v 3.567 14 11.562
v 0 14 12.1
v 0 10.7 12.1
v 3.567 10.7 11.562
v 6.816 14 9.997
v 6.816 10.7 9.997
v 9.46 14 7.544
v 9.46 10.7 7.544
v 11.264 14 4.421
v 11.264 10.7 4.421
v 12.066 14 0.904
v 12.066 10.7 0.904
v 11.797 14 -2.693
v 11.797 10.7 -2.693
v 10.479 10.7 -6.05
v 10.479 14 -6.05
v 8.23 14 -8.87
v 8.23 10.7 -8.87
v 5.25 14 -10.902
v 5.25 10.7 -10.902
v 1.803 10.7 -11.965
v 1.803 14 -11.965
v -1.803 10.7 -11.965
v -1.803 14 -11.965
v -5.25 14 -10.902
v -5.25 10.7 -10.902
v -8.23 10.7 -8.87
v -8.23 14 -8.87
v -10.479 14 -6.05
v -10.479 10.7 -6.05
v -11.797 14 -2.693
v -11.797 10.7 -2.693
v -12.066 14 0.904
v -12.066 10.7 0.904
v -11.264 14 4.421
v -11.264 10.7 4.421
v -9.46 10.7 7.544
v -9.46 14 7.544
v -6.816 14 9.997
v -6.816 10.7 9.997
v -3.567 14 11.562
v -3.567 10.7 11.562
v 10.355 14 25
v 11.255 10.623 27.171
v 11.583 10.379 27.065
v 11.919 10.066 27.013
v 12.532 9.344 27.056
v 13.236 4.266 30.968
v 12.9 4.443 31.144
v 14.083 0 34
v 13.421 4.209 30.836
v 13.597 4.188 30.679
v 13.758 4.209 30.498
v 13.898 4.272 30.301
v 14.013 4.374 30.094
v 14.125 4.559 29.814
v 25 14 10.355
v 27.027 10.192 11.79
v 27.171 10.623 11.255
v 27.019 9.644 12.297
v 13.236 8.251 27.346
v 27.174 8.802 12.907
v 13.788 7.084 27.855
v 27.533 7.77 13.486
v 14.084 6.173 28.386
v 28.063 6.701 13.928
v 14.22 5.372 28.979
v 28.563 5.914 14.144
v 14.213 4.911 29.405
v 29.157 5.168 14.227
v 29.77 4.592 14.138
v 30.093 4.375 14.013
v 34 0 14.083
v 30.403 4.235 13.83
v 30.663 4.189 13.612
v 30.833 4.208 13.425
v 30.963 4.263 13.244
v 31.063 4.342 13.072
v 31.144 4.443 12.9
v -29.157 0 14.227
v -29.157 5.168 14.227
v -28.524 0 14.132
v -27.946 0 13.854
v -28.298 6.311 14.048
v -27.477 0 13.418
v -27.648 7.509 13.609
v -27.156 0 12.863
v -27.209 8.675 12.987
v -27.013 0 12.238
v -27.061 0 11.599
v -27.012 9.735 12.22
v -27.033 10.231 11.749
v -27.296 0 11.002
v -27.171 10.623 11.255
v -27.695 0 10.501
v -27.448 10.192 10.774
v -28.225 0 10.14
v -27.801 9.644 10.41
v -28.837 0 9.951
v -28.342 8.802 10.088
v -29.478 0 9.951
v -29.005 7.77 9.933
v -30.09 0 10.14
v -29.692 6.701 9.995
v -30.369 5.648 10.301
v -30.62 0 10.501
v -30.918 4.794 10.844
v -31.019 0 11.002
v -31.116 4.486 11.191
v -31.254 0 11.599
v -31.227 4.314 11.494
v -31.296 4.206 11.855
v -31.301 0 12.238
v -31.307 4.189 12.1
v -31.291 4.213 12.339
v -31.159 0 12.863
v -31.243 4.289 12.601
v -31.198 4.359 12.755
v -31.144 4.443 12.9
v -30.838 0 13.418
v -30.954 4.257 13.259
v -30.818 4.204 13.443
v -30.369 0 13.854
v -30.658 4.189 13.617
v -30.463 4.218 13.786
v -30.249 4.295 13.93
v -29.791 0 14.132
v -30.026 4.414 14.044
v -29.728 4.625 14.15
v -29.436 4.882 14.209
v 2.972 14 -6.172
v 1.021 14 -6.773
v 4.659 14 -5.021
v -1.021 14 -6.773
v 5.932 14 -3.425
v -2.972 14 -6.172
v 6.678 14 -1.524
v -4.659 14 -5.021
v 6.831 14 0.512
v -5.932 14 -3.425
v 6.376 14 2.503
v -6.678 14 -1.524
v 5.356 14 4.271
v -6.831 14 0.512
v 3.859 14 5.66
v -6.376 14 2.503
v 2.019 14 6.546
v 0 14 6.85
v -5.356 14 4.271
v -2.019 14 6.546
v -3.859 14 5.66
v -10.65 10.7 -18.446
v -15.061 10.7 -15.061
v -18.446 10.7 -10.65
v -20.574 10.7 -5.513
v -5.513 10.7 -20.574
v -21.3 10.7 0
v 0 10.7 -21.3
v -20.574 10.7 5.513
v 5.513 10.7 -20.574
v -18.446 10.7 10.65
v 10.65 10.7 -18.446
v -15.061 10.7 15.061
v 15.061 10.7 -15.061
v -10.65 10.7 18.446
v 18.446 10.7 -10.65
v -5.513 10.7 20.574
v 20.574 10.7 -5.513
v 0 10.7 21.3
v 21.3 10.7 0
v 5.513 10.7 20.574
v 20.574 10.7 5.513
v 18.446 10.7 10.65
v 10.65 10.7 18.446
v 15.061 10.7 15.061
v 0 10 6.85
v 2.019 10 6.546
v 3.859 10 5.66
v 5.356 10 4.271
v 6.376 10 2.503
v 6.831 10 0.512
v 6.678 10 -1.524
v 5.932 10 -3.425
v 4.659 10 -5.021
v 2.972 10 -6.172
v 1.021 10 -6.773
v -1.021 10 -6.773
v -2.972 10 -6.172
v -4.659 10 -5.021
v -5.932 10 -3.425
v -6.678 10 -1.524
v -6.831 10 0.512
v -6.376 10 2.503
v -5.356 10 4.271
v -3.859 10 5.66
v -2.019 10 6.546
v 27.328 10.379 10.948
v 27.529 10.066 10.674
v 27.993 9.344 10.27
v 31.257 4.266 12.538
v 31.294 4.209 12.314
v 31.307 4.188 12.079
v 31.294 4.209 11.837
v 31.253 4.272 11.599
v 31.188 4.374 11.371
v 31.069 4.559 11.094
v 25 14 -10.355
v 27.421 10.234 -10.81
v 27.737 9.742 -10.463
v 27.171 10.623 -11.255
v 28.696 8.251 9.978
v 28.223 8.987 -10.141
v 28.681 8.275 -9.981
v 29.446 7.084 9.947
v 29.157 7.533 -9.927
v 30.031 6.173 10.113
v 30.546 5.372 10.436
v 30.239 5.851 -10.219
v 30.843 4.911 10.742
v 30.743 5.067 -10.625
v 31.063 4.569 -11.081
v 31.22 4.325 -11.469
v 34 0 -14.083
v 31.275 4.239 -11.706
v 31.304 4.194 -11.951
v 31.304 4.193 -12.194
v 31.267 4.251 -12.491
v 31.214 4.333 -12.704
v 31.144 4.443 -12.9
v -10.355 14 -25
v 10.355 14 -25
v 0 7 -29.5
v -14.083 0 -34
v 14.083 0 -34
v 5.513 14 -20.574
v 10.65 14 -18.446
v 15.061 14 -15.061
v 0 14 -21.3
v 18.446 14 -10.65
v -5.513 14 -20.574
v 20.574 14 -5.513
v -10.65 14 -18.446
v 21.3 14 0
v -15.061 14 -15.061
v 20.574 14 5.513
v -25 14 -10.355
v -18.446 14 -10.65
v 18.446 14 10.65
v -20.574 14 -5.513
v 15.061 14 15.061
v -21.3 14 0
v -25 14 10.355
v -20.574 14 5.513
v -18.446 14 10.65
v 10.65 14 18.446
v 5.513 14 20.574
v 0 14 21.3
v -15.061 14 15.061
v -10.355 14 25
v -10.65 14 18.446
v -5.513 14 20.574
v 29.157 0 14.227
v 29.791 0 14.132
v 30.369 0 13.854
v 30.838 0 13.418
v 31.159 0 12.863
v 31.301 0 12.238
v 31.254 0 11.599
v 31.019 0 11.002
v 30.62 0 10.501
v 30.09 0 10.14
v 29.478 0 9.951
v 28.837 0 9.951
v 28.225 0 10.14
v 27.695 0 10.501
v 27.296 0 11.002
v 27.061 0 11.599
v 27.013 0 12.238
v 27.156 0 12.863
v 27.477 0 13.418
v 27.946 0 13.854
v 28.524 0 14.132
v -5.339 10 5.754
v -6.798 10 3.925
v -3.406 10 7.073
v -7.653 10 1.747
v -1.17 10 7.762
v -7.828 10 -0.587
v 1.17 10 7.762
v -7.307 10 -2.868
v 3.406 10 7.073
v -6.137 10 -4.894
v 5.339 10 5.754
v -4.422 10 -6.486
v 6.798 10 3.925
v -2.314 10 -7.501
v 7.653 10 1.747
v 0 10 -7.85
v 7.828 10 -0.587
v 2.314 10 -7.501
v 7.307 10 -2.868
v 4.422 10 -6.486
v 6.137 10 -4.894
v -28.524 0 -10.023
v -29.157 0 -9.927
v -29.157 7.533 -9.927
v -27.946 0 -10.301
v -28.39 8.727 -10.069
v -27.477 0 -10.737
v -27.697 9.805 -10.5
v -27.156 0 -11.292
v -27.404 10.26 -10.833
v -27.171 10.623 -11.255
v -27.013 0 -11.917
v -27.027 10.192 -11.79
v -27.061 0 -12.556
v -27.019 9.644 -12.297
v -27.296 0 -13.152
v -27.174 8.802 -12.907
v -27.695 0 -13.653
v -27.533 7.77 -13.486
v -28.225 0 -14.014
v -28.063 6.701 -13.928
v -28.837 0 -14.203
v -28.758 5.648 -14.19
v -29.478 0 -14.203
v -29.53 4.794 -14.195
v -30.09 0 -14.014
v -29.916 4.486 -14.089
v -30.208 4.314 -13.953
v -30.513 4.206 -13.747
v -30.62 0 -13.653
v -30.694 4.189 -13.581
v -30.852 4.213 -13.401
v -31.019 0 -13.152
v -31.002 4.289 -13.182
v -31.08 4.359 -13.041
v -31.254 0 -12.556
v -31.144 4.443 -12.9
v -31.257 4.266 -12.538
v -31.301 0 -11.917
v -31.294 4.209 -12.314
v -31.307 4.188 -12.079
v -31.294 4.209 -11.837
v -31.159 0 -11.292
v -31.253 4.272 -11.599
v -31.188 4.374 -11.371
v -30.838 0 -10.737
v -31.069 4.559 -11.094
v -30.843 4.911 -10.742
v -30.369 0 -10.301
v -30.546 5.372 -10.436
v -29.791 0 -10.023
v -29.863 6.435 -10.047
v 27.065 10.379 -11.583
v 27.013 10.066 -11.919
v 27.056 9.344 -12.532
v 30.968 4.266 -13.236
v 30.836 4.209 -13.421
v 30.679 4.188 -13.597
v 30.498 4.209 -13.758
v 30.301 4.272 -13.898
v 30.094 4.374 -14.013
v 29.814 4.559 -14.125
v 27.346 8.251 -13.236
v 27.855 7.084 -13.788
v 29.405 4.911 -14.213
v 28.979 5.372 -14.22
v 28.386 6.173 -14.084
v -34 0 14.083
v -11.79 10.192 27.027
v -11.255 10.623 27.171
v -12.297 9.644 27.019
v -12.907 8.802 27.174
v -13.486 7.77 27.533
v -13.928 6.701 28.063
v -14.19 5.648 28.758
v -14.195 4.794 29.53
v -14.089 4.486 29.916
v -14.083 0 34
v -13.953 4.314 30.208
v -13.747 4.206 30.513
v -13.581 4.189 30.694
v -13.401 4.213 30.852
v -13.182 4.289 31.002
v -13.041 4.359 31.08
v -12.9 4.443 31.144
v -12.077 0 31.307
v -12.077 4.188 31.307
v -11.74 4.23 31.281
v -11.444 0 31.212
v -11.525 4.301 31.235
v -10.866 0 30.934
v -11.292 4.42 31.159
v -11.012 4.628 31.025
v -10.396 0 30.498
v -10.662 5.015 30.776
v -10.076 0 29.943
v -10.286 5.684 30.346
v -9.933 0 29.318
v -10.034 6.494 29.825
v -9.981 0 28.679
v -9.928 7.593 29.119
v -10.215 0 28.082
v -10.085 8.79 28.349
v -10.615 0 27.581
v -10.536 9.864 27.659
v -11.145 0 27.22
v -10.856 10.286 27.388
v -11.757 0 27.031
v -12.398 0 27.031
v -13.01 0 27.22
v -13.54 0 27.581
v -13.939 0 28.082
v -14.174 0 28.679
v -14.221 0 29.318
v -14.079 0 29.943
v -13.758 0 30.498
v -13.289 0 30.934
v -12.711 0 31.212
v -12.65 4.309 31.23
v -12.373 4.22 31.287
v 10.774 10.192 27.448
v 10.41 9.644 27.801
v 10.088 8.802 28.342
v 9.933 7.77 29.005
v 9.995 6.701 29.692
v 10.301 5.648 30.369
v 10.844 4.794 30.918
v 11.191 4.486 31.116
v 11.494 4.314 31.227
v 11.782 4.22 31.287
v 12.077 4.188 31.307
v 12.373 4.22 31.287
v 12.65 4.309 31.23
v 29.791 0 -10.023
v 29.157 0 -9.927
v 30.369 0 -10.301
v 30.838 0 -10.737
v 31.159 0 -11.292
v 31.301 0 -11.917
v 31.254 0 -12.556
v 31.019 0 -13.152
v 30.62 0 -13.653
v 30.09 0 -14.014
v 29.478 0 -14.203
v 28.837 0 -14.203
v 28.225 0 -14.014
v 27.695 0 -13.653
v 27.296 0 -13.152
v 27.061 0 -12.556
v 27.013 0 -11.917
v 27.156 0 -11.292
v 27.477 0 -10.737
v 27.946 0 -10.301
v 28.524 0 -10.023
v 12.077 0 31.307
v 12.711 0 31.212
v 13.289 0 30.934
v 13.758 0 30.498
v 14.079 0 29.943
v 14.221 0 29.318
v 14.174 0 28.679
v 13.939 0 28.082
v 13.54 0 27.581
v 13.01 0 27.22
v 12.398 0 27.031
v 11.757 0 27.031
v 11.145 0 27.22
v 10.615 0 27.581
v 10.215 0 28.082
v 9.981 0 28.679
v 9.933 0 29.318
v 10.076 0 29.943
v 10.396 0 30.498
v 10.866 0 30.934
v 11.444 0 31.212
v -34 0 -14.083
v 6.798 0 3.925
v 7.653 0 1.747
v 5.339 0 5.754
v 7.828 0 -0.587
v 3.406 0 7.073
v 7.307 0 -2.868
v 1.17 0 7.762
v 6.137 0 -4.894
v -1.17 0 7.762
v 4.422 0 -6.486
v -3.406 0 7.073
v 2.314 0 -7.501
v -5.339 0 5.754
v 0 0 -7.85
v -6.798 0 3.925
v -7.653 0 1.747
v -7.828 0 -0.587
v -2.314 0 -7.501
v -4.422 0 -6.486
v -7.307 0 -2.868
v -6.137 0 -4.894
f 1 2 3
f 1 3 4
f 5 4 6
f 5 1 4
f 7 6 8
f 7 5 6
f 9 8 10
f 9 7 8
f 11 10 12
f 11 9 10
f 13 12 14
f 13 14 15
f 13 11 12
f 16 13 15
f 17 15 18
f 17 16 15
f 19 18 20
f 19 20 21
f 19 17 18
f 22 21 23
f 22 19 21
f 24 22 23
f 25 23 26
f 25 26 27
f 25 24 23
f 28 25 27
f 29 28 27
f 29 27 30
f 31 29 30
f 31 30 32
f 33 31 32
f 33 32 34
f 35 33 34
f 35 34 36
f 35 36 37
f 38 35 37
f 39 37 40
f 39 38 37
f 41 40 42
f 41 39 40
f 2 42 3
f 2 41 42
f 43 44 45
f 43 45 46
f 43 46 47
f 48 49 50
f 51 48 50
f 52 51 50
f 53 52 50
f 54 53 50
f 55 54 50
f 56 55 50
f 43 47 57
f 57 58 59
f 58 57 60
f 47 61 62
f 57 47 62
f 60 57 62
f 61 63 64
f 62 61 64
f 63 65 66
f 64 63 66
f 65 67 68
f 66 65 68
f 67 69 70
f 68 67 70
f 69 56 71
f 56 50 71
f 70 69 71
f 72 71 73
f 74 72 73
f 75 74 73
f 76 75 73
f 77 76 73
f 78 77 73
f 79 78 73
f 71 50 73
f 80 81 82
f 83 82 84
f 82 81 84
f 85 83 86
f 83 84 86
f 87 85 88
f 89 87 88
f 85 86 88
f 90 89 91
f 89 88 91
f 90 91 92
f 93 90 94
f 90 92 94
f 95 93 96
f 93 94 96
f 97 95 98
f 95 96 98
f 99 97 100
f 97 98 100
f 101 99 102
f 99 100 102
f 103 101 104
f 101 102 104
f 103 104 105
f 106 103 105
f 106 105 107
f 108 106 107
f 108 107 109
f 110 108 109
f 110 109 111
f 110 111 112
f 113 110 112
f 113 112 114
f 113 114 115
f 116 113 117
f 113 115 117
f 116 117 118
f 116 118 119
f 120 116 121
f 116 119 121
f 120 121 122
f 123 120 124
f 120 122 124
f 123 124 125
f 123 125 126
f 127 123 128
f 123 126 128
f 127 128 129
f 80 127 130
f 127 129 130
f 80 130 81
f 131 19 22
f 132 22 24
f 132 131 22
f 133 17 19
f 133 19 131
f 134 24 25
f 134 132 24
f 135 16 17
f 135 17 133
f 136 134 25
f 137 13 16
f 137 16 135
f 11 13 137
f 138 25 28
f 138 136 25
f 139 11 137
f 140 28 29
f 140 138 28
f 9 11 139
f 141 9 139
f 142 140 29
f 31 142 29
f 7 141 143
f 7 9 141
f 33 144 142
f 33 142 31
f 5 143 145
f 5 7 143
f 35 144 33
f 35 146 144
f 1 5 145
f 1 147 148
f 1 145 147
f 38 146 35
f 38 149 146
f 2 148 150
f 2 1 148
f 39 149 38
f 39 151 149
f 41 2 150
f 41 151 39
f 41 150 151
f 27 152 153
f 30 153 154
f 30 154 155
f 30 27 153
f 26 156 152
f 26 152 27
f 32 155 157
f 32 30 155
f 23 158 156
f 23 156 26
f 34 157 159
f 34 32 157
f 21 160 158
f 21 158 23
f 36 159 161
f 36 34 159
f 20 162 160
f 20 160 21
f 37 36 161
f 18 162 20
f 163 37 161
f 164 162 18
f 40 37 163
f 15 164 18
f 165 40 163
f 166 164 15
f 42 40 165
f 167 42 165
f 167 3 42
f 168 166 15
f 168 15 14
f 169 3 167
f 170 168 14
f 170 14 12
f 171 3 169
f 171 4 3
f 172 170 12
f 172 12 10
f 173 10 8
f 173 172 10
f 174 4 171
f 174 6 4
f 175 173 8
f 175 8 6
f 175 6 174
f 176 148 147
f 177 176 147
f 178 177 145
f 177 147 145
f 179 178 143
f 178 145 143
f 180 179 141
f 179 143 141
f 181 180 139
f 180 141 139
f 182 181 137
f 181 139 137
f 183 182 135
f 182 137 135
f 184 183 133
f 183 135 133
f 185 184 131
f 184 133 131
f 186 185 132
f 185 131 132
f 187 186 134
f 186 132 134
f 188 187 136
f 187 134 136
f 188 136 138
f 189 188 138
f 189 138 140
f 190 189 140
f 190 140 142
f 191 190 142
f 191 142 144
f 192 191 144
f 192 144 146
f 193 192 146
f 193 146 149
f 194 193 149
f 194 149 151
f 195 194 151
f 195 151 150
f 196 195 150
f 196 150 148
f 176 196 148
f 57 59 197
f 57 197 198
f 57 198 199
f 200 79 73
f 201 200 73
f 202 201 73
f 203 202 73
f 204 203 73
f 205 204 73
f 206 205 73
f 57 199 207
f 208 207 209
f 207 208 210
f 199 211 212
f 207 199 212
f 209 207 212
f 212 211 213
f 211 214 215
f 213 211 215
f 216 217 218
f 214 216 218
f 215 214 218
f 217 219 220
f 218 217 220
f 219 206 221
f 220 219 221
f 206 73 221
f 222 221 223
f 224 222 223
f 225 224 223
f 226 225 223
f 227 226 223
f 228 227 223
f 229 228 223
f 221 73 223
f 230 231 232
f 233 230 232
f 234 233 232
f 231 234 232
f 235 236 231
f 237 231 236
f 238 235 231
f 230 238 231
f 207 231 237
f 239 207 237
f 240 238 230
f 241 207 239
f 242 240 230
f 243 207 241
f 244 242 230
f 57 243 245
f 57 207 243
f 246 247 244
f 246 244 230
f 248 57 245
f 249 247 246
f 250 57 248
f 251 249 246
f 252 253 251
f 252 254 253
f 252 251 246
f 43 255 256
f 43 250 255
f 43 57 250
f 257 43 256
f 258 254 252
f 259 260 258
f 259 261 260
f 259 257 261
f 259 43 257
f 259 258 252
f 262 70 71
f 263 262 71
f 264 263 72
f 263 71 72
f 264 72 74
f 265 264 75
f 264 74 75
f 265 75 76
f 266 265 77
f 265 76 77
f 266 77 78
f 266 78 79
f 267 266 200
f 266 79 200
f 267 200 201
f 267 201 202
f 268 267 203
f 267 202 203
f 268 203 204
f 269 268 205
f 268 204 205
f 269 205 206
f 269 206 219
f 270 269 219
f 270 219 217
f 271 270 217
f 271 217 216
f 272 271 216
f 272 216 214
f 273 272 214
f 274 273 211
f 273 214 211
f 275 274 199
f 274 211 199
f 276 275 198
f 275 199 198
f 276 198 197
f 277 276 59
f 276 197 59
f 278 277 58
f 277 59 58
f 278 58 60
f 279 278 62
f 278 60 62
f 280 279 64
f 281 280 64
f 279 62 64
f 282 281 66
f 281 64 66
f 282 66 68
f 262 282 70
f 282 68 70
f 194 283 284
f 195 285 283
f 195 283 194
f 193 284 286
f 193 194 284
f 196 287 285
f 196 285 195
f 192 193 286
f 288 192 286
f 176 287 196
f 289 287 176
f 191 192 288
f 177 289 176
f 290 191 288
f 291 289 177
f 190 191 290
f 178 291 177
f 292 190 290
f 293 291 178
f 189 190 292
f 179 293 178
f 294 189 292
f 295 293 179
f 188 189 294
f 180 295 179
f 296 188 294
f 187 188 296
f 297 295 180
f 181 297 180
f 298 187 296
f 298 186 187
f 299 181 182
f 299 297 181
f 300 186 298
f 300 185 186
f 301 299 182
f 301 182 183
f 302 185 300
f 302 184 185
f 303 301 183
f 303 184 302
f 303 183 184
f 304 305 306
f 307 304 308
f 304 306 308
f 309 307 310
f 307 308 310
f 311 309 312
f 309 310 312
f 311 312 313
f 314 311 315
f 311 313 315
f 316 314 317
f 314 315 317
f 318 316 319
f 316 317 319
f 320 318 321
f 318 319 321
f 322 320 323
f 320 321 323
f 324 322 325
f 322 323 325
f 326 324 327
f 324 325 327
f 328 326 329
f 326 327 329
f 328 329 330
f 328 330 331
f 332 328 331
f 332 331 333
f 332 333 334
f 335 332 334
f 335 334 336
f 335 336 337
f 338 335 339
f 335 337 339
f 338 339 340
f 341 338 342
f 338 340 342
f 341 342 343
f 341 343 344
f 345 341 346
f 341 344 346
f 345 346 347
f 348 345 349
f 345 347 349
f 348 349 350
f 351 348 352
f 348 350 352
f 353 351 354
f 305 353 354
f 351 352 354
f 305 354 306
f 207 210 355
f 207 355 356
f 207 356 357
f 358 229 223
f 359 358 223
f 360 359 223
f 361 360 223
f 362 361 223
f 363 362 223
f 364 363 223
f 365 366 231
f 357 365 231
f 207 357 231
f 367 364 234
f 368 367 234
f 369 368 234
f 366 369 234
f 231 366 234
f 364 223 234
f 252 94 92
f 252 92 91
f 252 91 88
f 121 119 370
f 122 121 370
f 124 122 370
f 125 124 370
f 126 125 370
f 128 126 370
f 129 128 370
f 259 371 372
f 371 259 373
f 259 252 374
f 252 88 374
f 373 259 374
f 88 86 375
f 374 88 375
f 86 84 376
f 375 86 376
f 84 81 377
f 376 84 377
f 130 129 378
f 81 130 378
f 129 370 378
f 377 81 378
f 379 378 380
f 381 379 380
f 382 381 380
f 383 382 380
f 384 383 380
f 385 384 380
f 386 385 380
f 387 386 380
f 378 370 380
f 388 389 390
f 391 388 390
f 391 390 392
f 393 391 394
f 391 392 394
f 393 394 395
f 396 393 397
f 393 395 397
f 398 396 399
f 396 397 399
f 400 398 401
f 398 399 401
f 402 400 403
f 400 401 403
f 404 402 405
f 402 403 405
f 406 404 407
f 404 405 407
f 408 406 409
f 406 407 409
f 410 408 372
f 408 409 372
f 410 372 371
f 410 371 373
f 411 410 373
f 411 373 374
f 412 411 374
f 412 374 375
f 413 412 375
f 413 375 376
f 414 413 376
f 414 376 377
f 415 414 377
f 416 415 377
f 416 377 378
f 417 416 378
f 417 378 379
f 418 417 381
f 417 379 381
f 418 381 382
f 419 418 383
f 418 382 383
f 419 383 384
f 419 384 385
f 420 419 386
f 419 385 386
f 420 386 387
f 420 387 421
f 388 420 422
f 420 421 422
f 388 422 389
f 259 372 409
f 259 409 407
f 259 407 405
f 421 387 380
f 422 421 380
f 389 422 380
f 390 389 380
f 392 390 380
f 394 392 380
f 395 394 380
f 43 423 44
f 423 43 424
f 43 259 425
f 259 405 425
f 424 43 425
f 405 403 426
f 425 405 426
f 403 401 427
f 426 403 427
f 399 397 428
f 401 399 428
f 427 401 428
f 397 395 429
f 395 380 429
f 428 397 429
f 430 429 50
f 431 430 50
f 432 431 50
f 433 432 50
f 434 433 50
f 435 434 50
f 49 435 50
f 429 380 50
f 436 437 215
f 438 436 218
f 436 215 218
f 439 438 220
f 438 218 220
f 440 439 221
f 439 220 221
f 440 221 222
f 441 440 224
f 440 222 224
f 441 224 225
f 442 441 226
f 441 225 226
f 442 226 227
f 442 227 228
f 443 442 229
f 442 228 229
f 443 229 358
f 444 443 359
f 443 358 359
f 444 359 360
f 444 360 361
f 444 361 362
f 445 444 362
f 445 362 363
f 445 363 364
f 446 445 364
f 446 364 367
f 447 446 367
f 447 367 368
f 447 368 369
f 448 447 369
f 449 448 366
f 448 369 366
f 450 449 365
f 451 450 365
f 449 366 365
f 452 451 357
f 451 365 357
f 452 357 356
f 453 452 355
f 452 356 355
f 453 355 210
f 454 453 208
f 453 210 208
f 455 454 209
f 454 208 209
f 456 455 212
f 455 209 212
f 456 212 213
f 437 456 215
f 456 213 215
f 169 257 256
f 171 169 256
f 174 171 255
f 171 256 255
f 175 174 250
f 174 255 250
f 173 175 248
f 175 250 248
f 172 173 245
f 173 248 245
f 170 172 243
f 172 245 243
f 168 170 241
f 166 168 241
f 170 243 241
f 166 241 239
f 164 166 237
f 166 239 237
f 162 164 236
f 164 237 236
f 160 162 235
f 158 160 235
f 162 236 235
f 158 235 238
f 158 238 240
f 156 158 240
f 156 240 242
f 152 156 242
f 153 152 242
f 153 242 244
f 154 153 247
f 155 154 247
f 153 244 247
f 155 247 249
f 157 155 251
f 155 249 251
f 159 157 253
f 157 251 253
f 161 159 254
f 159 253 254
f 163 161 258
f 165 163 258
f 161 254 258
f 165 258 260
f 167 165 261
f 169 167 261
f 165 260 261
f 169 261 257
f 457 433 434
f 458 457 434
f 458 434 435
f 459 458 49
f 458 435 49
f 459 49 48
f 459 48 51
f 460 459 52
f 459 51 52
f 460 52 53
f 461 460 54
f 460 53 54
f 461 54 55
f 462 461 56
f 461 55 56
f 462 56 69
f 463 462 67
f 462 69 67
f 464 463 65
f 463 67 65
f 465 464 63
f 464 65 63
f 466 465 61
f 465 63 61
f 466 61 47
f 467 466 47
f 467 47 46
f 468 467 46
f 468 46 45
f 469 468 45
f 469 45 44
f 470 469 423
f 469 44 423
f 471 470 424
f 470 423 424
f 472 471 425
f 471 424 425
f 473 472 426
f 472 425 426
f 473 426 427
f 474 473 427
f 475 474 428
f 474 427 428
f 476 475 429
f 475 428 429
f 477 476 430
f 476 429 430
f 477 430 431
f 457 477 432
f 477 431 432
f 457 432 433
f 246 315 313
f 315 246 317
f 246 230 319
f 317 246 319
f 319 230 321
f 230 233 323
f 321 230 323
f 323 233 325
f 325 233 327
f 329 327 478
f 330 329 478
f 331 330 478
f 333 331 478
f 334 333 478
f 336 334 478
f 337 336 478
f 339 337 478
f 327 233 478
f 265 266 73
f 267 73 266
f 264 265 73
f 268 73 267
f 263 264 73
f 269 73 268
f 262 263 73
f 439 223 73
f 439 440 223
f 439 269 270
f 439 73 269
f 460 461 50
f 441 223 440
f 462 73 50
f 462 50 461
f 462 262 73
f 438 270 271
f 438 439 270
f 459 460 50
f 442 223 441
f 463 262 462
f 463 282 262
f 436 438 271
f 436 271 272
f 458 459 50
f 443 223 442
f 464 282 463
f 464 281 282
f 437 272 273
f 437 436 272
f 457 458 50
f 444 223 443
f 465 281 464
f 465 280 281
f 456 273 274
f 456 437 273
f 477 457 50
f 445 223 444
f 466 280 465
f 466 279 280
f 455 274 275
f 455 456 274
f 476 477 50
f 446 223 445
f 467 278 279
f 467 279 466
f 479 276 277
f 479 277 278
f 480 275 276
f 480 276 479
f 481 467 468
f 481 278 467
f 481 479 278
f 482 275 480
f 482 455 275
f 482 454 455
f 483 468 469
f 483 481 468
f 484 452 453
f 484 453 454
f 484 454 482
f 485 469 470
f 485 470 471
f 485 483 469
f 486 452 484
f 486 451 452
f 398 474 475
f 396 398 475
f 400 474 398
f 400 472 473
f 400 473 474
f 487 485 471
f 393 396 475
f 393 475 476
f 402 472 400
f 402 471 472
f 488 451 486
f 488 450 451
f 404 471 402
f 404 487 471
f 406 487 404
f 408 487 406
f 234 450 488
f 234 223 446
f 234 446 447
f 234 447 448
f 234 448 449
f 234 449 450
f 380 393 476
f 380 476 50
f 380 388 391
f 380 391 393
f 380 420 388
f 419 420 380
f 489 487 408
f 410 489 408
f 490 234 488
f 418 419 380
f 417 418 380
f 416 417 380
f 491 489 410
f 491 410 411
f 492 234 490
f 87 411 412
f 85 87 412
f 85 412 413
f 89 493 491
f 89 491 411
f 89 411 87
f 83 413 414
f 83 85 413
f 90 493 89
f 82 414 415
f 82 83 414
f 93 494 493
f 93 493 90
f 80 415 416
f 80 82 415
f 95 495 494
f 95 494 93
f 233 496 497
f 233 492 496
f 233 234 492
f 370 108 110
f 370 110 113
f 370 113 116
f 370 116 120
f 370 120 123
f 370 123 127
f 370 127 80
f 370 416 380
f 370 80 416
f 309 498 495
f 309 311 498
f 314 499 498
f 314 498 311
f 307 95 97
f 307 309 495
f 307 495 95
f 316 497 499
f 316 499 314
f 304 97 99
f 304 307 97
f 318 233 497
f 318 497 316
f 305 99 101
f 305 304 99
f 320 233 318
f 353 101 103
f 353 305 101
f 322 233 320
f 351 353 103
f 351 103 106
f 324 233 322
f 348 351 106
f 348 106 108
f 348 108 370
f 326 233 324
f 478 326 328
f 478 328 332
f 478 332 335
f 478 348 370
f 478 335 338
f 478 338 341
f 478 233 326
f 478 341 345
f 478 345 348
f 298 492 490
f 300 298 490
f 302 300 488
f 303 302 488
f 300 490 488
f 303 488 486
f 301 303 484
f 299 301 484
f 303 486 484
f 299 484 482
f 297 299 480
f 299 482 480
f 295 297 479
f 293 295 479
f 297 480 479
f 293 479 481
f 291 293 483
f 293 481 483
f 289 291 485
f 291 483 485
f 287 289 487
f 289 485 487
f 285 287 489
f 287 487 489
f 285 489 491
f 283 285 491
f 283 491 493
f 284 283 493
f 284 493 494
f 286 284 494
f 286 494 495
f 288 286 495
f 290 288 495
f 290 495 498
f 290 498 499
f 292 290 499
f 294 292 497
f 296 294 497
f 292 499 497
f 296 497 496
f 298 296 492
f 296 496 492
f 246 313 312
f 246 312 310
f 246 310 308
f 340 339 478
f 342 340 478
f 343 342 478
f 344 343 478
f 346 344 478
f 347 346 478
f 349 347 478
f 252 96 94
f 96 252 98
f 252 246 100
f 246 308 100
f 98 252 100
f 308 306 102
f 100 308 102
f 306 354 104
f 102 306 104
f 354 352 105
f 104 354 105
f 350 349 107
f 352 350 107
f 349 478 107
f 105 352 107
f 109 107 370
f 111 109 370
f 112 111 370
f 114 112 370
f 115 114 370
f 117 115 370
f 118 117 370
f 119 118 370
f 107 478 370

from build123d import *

# Parameters (mm, degrees)
SKETCH_4_R          = 6.85
SKETCH_4_R_2        = 2.15
CUT_EXTRUDE_1_DEPTH = 51.079936266
SKETCH_6_R          = 21.3
SKETCH_6_R_2        = 12.1
CUT_EXTRUDE_3_DEPTH = 3.3
SKETCH_7_R          = 7.85
CUT_EXTRUDE_4_DEPTH = 10


with BuildPart() as part:
    # 草图3 → 放样1 section 0
    with BuildSketch(Plane(origin=(0, 14, 0), x_dir=(1, 0, 0), z_dir=(0, 1, 0))):
        with BuildLine():
            Line((25, 10.355339059), (10.355339059, 25))
            Line((10.355339059, 25), (-10.355339059, 25))
            Line((-10.355339059, 25), (-25, 10.355339059))
            Line((-25, 10.355339059), (-25, -10.355339059))
            Line((-25, -10.355339059), (-10.355339059, -25))
            Line((-10.355339059, -25), (10.355339059, -25))
            Line((10.355339059, -25), (25, -10.355339059))
            Line((25, -10.355339059), (25, 10.355339059))
        make_face()
    # 草图1 → 放样1 section 1
    with BuildSketch(Plane(origin=(0, 0, 0), x_dir=(1, 0, 0), z_dir=(0, 1, 0))):
        with BuildLine():
            Line((34, -14.083261121), (34, 14.083261121))
            Line((34, 14.083261121), (14.083261121, 34))
            Line((14.083261121, 34), (-14.083261121, 34))
            Line((-14.083261121, 34), (-34, 14.083261121))
            Line((-34, 14.083261121), (-34, -14.083261121))
            Line((-34, -14.083261121), (-14.083261121, -34))
            Line((-14.083261121, -34), (14.083261121, -34))
            Line((14.083261121, -34), (34, -14.083261121))
        make_face()
    loft()

    # 草图4 → 切除-拉伸1 (cut, through all)
    with BuildSketch(Plane(origin=(0, 14, 0), x_dir=(1, 0, 0), z_dir=(0, 1, 0))):
        with Locations(Location((0, 0, 0), (0, 0, 270))):
            Circle(SKETCH_4_R)
        with Locations(Location((-29.157457896, 12.077414505, 0), (0, 0, 270))):
            Circle(SKETCH_4_R_2)
        with Locations(Location((29.157457896, 12.077414505, 0), (0, 0, 270))):
            Circle(SKETCH_4_R_2)
        with Locations(Location((29.157457896, -12.077414505, 0), (0, 0, 270))):
            Circle(SKETCH_4_R_2)
        with Locations(Location((12.077414505, -29.157457896, 0), (0, 0, 270))):
            Circle(SKETCH_4_R_2)
        with Locations(Location((-12.077414505, -29.157457896, 0), (0, 0, 270))):
            Circle(SKETCH_4_R_2)
        with Locations(Location((-29.157457896, -12.077414505, 0), (0, 0, 270))):
            Circle(SKETCH_4_R_2)
    extrude(amount=-CUT_EXTRUDE_1_DEPTH, mode=Mode.SUBTRACT)

    # 草图6 → 切除-拉伸3 (cut)
    with BuildSketch(Plane(origin=(0, 14, 0), x_dir=(1, 0, 0), z_dir=(0, 1, 0))):
        with Locations(Location((0, 0, 0), (0, 0, 270))):
            Circle(SKETCH_6_R)
        with Locations(Location((0, 0, 0), (0, 0, 270))):
            Circle(SKETCH_6_R_2, mode=Mode.SUBTRACT)
    extrude(amount=-CUT_EXTRUDE_3_DEPTH, mode=Mode.SUBTRACT)

    # 草图7 → 切除-拉伸4 (cut)
    with BuildSketch(Plane.XZ):
        with Locations(Location((0, 0, 0), (0, 0, 270))):
            Circle(SKETCH_7_R)
    extrude(amount=-CUT_EXTRUDE_4_DEPTH, mode=Mode.SUBTRACT)


solid = part.part
